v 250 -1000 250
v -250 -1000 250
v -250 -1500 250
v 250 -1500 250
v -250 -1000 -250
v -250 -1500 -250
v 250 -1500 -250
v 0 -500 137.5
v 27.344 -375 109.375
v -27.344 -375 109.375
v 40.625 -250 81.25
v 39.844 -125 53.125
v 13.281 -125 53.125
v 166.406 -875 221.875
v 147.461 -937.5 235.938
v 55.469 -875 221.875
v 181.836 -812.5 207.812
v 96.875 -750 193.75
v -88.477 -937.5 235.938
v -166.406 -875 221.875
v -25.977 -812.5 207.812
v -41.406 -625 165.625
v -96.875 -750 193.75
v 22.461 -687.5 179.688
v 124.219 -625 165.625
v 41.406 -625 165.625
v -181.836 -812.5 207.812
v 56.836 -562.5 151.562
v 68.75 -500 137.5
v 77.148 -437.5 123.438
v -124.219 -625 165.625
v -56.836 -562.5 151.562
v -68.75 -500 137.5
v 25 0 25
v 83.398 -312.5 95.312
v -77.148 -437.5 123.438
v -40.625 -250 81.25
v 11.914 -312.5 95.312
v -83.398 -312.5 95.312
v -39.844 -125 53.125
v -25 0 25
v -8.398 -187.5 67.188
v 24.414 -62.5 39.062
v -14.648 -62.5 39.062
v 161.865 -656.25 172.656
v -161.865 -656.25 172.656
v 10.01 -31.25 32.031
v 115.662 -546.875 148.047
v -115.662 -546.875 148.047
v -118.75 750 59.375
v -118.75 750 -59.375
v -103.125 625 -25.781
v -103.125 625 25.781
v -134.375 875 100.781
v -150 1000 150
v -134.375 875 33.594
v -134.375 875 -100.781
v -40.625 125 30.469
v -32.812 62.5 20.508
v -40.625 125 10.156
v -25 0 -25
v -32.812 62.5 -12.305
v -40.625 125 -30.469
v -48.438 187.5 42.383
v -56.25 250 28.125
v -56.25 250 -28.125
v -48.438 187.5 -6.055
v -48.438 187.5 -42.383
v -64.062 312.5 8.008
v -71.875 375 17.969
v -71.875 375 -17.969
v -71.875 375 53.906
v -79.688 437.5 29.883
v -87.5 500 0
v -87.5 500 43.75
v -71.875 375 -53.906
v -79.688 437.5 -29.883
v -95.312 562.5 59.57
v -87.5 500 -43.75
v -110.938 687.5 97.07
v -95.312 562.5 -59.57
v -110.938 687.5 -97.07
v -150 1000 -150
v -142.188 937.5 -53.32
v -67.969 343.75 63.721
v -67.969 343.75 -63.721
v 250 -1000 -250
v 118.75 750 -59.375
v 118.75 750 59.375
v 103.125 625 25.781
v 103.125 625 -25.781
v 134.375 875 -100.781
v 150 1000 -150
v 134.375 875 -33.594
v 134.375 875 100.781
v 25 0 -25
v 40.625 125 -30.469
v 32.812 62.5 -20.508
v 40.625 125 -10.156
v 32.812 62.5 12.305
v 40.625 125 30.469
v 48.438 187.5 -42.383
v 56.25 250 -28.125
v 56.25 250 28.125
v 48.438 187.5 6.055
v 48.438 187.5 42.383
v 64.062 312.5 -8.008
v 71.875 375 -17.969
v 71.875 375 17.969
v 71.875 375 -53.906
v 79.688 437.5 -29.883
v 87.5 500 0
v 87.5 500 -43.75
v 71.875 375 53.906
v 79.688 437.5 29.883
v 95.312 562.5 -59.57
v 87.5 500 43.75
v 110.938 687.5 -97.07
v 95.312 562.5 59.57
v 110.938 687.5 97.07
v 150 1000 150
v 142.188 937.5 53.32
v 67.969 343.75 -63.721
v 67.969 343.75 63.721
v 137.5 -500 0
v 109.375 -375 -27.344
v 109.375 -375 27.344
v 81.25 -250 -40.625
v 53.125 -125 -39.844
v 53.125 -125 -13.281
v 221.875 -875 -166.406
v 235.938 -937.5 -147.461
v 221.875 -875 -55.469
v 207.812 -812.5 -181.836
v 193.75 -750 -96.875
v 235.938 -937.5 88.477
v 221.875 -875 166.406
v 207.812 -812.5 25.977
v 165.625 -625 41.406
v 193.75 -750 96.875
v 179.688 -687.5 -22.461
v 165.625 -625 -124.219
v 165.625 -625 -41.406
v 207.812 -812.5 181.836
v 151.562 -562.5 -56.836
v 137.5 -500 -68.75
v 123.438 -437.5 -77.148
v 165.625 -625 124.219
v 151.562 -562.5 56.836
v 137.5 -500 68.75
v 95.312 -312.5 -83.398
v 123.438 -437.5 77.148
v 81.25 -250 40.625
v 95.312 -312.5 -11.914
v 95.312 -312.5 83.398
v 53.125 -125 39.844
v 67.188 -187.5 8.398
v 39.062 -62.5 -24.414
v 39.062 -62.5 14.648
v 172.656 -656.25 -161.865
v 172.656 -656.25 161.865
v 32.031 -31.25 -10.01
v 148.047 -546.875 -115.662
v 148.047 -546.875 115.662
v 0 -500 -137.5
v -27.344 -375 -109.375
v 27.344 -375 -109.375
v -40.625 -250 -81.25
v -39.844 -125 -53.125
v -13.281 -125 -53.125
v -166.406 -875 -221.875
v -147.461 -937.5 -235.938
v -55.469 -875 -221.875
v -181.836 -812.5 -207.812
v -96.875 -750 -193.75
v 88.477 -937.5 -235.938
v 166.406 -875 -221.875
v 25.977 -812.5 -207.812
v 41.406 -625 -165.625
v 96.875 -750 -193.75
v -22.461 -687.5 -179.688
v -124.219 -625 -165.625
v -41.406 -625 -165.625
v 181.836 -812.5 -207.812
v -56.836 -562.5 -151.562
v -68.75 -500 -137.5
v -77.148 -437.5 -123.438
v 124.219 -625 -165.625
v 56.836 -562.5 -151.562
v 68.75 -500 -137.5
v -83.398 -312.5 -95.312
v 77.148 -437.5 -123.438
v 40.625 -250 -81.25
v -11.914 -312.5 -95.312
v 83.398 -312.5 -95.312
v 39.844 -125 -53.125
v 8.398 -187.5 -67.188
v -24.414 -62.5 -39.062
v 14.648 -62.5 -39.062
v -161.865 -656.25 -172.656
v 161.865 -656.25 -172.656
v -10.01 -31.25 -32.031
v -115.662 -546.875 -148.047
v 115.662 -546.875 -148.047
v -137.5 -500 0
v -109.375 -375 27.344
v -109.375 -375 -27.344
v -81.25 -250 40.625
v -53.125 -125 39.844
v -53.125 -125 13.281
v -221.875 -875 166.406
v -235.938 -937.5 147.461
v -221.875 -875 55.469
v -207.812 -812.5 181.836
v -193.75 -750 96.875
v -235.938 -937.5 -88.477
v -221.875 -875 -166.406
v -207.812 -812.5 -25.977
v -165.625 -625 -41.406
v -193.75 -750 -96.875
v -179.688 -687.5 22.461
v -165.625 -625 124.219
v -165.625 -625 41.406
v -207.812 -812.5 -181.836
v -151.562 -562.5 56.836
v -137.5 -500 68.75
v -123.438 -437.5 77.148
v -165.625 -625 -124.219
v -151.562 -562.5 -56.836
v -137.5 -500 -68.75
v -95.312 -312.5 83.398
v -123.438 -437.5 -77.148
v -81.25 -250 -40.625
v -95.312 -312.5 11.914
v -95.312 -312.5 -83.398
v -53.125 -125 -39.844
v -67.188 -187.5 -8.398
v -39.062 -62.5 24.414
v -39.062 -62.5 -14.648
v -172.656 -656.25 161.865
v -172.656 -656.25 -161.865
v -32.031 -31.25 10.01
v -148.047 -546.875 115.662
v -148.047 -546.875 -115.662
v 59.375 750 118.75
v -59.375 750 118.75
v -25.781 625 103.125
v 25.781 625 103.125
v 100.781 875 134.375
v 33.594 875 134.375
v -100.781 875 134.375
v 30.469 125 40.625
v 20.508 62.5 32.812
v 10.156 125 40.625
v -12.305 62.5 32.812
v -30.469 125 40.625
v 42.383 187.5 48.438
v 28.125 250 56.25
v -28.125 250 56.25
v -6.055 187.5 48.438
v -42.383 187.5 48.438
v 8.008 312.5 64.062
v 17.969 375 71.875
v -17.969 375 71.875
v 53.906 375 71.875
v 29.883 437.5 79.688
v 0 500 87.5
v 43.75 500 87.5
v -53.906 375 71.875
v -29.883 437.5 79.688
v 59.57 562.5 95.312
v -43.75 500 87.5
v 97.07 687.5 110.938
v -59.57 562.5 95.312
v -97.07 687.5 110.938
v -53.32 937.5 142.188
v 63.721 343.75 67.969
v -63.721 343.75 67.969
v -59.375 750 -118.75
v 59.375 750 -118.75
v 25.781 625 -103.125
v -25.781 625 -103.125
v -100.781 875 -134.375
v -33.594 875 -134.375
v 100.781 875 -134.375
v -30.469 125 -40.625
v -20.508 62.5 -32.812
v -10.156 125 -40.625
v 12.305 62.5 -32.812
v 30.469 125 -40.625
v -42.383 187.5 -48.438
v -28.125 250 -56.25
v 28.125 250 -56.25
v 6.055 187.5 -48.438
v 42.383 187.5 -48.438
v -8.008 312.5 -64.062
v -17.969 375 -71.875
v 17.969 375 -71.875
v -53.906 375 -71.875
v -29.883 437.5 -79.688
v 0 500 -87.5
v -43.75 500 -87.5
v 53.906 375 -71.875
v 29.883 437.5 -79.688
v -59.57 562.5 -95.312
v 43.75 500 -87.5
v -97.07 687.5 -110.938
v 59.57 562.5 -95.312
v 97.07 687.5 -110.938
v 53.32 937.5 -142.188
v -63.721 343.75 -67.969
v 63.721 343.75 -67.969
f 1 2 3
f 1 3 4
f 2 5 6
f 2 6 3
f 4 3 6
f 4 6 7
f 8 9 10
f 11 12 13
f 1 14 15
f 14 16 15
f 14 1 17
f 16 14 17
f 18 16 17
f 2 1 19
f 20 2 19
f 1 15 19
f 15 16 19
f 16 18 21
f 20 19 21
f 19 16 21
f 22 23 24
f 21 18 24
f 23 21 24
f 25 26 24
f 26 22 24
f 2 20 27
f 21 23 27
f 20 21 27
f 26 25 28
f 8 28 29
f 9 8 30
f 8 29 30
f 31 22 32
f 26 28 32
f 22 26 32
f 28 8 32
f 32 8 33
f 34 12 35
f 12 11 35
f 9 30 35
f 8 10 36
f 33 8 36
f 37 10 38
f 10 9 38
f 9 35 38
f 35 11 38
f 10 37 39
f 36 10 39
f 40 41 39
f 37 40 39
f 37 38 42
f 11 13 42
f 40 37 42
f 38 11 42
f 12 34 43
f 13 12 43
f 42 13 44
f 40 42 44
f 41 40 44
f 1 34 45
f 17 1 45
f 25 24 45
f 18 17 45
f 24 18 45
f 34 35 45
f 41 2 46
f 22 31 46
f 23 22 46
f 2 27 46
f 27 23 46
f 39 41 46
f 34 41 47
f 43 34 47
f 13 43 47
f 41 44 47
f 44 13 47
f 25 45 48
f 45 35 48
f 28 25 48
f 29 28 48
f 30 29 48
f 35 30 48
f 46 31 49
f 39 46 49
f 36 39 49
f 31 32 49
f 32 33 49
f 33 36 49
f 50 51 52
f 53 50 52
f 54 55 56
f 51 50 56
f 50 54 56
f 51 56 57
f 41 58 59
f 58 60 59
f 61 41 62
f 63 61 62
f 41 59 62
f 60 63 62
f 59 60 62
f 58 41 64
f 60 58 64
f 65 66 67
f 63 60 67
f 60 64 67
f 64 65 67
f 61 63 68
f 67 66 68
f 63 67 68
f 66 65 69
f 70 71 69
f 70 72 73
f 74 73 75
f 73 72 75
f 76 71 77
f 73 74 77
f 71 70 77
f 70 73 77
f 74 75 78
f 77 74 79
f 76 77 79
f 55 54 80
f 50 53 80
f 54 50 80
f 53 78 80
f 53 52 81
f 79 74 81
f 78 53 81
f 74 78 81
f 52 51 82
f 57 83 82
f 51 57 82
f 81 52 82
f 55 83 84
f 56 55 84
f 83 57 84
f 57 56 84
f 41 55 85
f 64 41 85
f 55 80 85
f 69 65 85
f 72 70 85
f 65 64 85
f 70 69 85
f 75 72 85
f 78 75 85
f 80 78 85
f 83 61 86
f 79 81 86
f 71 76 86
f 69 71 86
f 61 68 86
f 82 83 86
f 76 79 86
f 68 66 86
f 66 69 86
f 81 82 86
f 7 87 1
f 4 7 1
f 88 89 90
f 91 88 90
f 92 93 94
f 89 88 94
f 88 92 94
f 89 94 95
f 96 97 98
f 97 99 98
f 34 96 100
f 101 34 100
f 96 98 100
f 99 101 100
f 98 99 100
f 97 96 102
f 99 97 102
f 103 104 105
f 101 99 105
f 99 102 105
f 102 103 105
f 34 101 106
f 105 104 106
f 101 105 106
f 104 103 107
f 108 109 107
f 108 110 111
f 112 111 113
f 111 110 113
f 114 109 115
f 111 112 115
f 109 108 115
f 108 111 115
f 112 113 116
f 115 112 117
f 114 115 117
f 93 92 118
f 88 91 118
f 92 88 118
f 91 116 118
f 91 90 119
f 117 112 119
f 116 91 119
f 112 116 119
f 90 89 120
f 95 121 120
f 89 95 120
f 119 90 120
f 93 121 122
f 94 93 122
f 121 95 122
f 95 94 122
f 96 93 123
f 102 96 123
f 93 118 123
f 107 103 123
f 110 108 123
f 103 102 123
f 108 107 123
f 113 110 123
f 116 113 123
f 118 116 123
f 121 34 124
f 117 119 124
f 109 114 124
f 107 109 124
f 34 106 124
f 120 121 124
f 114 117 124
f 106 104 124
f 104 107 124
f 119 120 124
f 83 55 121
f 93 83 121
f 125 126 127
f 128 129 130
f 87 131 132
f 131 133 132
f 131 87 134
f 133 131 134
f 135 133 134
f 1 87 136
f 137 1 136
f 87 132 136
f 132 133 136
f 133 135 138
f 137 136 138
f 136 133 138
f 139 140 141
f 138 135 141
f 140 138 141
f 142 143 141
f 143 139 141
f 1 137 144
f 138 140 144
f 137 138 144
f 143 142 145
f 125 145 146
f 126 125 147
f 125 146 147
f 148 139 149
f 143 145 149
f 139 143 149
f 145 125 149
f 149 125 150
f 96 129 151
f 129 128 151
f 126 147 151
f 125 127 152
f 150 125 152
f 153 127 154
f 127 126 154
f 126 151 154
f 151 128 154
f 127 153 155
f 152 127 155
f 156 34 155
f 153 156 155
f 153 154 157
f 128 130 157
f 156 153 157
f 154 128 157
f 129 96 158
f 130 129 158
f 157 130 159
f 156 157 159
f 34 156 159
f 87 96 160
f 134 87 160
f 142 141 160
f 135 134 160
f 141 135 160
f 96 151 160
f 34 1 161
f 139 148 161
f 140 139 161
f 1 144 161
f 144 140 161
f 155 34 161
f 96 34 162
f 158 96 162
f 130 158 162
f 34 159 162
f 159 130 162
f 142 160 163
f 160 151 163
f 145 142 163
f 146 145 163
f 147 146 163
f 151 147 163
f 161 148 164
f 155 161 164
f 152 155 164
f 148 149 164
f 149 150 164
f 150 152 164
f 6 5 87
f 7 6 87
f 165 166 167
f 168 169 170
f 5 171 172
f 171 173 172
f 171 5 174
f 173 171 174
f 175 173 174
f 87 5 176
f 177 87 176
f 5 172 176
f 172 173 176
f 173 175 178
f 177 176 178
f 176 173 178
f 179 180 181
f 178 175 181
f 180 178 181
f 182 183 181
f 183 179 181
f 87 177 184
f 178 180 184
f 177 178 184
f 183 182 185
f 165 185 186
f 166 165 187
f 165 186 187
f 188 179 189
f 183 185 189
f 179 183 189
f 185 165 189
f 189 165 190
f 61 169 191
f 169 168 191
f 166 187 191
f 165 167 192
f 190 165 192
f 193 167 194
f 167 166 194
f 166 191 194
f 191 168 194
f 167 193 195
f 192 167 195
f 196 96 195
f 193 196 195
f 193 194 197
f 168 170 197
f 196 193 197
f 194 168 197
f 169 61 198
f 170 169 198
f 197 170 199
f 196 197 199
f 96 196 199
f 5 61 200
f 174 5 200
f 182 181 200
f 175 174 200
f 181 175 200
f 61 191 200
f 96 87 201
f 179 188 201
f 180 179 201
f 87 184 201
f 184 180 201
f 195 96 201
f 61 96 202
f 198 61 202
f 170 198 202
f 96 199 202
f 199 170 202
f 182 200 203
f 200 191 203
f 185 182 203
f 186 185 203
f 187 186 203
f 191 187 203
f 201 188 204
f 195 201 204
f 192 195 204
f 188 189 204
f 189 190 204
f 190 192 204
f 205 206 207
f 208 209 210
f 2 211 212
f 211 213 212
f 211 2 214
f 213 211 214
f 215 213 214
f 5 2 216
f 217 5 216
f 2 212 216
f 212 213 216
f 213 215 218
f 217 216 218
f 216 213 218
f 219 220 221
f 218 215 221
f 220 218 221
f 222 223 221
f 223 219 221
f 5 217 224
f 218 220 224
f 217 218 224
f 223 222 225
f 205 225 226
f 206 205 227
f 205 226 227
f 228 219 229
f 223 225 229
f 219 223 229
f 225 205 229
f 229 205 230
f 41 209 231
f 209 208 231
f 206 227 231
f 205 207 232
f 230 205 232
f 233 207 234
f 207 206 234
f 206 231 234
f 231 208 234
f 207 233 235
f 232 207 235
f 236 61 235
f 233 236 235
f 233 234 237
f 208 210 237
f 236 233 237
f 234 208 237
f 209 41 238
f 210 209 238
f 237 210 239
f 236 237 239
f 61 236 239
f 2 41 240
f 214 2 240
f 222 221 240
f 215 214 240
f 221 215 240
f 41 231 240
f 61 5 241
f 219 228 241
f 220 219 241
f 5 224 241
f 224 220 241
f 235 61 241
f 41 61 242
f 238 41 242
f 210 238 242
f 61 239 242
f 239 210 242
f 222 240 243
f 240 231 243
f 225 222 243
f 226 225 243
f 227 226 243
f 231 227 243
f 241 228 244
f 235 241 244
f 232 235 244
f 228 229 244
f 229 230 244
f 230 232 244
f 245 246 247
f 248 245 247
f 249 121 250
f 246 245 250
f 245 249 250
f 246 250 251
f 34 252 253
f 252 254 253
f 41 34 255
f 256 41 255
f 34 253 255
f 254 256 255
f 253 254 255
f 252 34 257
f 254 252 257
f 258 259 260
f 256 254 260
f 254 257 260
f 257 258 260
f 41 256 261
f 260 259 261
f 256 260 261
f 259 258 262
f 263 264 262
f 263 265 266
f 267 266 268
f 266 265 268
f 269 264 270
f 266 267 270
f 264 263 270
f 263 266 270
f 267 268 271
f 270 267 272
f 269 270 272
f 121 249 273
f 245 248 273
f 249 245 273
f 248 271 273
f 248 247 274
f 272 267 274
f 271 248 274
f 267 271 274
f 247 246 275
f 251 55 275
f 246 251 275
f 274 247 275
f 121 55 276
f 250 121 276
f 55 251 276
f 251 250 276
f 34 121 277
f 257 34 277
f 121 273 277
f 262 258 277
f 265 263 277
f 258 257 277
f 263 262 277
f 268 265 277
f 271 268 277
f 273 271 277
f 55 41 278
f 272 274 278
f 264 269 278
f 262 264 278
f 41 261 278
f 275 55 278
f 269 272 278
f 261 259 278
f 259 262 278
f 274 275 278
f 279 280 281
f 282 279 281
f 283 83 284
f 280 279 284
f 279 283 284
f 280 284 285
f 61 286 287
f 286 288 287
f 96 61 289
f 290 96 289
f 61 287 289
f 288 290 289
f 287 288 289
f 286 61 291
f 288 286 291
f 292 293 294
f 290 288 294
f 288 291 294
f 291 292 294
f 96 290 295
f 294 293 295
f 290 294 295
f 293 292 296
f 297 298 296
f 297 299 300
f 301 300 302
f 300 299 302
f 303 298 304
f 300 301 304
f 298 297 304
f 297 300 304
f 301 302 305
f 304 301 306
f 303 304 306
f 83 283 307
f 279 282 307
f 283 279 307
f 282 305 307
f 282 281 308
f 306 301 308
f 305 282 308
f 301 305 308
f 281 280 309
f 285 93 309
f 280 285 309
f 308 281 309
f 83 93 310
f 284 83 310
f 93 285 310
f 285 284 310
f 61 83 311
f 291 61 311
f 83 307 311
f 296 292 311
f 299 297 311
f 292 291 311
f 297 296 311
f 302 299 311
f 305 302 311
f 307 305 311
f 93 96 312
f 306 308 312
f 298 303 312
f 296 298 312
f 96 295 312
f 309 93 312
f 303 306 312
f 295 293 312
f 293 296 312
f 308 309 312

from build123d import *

# Parameters (mm, degrees)
F2_W      = 500
F2_H      = 500
F1_W      = 50
F1_H      = 50
F5_W      = 300
F5_H      = 300
F3_FACE_W = 500
F3_FACE_H = 500
F7_DEPTH  = 500


with BuildPart() as f3:
    # F2 (on offset) → F3 section 0
    with BuildSketch(Plane.XZ.offset(1000)):
        Rectangle(F2_W, F2_H)
    # F1 (on Front) → F3 section 1
    with BuildSketch(Plane.XZ):
        Rectangle(F1_W, F1_H)
    loft()

    # F1 (on Front) → F6 section 0
    with BuildSketch(Plane.XZ):
        Rectangle(F1_W, F1_H)
    # F5 (on offset) → F6 section 1
    with BuildSketch(Plane.XZ.offset(-1000)):
        Rectangle(F5_W, F5_H)
    loft()

    # F3_face (on face) → F7 (join)
    with BuildSketch(Plane.XZ.offset(1000)):
        Rectangle(F3_FACE_W, F3_FACE_H)
    extrude(amount=F7_DEPTH)


solid = f3.part
